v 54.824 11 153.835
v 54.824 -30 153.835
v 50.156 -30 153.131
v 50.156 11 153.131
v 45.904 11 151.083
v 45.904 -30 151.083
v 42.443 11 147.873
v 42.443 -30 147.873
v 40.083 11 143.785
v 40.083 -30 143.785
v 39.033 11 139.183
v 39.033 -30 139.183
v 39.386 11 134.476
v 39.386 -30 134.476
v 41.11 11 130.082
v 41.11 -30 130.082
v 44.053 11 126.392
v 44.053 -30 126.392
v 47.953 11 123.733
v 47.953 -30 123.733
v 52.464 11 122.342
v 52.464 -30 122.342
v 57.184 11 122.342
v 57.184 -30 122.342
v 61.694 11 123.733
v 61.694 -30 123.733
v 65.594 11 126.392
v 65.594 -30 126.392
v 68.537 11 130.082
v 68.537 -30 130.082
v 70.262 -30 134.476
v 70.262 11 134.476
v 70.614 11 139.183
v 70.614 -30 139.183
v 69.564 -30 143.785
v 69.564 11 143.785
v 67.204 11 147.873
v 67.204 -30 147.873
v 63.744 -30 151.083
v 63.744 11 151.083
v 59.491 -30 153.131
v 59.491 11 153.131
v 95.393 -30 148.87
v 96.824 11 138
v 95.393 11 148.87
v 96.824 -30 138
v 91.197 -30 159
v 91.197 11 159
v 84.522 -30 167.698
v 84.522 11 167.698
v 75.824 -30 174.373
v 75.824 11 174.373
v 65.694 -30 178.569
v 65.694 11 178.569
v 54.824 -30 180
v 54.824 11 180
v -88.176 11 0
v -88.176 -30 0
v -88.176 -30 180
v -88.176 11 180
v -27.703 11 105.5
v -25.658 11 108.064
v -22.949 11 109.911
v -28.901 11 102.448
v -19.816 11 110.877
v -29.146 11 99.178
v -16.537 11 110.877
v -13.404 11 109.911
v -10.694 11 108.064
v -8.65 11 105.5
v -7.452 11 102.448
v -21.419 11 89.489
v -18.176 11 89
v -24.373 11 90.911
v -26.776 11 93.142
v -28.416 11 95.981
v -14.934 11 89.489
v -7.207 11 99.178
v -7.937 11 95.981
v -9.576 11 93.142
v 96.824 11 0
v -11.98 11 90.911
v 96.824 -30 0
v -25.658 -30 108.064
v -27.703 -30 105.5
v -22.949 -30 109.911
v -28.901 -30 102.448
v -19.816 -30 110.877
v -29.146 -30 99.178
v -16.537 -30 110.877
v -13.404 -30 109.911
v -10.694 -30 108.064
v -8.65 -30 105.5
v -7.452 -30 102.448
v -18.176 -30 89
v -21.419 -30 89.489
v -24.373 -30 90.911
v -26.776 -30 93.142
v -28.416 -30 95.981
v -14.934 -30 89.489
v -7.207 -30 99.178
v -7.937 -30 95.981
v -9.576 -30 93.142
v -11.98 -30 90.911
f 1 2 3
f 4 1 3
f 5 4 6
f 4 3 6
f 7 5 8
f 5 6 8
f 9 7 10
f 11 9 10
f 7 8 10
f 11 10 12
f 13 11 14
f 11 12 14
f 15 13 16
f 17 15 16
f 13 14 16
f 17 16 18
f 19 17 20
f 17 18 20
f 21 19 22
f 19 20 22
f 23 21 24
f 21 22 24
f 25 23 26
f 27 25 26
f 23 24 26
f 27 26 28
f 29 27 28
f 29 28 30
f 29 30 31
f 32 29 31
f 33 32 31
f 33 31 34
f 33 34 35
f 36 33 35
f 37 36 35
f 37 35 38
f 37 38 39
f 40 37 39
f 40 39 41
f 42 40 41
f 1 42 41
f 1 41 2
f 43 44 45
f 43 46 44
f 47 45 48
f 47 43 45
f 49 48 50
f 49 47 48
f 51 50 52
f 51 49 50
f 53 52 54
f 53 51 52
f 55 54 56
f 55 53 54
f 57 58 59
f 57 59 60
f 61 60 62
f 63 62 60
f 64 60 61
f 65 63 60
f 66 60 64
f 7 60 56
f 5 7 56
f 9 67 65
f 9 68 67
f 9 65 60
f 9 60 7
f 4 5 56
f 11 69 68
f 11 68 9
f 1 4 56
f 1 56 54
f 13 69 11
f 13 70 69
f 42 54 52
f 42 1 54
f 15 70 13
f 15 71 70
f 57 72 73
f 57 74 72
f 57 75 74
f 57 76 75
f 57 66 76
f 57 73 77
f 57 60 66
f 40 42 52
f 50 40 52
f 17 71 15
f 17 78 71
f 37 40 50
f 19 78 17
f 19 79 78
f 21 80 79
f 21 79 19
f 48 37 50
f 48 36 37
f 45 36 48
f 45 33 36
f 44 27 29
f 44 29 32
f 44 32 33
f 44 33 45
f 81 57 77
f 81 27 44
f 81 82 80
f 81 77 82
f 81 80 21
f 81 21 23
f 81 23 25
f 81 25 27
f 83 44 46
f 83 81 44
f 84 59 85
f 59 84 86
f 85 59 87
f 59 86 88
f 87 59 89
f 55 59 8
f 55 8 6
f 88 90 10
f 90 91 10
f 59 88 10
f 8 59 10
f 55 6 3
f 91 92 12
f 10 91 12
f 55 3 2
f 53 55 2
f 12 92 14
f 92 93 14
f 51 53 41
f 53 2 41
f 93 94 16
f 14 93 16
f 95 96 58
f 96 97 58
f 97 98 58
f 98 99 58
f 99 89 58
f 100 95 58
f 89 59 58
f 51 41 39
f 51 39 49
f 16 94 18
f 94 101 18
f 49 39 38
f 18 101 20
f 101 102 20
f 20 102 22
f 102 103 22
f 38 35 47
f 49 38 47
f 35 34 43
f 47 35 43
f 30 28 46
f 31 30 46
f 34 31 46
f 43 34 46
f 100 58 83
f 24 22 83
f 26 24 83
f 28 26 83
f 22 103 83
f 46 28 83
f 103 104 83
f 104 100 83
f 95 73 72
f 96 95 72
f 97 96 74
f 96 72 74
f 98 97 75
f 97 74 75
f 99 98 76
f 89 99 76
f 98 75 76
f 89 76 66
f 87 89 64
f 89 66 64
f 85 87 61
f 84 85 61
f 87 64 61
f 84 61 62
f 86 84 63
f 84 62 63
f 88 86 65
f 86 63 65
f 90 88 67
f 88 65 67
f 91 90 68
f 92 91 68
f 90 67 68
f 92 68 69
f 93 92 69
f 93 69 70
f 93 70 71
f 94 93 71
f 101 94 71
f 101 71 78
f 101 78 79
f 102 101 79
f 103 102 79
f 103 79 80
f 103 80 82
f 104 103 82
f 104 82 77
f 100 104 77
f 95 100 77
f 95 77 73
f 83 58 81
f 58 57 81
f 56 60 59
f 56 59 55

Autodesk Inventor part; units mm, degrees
ref_plane "YZ Plane" through (0, 0, 0) normal (1, 0, 0) x (0, 1, 0)
ref_plane "XZ Plane" through (0, 0, 0) normal (0, 1, 0) x (-1, 0, 0)
ref_plane "XY Plane" through (0, 0, 0) normal (0, 0, 1) x (1, 0, 0)
sketch "Эскиз1" plane through (0, 0, 0) normal (0, 0, 1) x (1, 0, 0)
  line L0 (-88.1763, -30) -> (96.8237, -30)
  line L1 (-88.1763, -30) -> (-88.1763, 11)
  line L2 (96.8237, 11) -> (96.8237, -30)
  line L3 (-88.1763, 11) -> (96.8237, 11)
  point P0 (0, 0)
  point P1 (0, -30)
  dimension "parametr_A" = 185
  dimension "parametr_C" = 41
extrude "Выдавливание2" add sketch "Эскиз1" along normal blind 180
fillet "Сопряжение1" radius 42 1 edges at (96.8237, -9.5, 180)
sketch "Эскиз5" plane through (-88.1763, -30, 0) normal (0, -1, 0) x (1, 0, 0)
  point P0 (70, 100)
hole "Отверстие5" at (-18.1763, -30, 100) direction (0, 1, 0) diameter 22 end through all
sketch "Эскиз7" plane through (-88.1763, 11, 0) normal (0, 1, 0) x (1, 0, 0)
  point P0 (143, -138)
hole "Отверстие7" at (54.8237, 11, 138) direction (0, -1, 0) diameter 31.67 depth 96 tip angle 120 thread size "M36x4" class "6H" standard "ISO Metric profile"
sketch "Эскиз2" plane through (-88.1763, -30, 0) normal (0, -1, 0) x (1, 0, 0)
  point P0 (114.3354, 27.5417)
sketch "Эскиз3" plane through (-88.1763, -30, 0) normal (0, -1, 0) x (1, 0, 0)
  point P0 (14.3354, 15.8973)
equation "\"parametr_A\" = parametr_A_"
equation "\"parametr_C\" = parametr_D_"
equation "\"paramert_B\" = parametr_B_"
equation "\"d21\" = parametr_G_"
equation "\"parametr_A_\" = 185"
equation "\"parametr_B_\" = 180"
equation "\"parametr_D_\" = 41"
equation "\"parametr_E_\" = 35"
equation "\"parametr_G_\" = 42"
properties part number "lw_6_part1"
